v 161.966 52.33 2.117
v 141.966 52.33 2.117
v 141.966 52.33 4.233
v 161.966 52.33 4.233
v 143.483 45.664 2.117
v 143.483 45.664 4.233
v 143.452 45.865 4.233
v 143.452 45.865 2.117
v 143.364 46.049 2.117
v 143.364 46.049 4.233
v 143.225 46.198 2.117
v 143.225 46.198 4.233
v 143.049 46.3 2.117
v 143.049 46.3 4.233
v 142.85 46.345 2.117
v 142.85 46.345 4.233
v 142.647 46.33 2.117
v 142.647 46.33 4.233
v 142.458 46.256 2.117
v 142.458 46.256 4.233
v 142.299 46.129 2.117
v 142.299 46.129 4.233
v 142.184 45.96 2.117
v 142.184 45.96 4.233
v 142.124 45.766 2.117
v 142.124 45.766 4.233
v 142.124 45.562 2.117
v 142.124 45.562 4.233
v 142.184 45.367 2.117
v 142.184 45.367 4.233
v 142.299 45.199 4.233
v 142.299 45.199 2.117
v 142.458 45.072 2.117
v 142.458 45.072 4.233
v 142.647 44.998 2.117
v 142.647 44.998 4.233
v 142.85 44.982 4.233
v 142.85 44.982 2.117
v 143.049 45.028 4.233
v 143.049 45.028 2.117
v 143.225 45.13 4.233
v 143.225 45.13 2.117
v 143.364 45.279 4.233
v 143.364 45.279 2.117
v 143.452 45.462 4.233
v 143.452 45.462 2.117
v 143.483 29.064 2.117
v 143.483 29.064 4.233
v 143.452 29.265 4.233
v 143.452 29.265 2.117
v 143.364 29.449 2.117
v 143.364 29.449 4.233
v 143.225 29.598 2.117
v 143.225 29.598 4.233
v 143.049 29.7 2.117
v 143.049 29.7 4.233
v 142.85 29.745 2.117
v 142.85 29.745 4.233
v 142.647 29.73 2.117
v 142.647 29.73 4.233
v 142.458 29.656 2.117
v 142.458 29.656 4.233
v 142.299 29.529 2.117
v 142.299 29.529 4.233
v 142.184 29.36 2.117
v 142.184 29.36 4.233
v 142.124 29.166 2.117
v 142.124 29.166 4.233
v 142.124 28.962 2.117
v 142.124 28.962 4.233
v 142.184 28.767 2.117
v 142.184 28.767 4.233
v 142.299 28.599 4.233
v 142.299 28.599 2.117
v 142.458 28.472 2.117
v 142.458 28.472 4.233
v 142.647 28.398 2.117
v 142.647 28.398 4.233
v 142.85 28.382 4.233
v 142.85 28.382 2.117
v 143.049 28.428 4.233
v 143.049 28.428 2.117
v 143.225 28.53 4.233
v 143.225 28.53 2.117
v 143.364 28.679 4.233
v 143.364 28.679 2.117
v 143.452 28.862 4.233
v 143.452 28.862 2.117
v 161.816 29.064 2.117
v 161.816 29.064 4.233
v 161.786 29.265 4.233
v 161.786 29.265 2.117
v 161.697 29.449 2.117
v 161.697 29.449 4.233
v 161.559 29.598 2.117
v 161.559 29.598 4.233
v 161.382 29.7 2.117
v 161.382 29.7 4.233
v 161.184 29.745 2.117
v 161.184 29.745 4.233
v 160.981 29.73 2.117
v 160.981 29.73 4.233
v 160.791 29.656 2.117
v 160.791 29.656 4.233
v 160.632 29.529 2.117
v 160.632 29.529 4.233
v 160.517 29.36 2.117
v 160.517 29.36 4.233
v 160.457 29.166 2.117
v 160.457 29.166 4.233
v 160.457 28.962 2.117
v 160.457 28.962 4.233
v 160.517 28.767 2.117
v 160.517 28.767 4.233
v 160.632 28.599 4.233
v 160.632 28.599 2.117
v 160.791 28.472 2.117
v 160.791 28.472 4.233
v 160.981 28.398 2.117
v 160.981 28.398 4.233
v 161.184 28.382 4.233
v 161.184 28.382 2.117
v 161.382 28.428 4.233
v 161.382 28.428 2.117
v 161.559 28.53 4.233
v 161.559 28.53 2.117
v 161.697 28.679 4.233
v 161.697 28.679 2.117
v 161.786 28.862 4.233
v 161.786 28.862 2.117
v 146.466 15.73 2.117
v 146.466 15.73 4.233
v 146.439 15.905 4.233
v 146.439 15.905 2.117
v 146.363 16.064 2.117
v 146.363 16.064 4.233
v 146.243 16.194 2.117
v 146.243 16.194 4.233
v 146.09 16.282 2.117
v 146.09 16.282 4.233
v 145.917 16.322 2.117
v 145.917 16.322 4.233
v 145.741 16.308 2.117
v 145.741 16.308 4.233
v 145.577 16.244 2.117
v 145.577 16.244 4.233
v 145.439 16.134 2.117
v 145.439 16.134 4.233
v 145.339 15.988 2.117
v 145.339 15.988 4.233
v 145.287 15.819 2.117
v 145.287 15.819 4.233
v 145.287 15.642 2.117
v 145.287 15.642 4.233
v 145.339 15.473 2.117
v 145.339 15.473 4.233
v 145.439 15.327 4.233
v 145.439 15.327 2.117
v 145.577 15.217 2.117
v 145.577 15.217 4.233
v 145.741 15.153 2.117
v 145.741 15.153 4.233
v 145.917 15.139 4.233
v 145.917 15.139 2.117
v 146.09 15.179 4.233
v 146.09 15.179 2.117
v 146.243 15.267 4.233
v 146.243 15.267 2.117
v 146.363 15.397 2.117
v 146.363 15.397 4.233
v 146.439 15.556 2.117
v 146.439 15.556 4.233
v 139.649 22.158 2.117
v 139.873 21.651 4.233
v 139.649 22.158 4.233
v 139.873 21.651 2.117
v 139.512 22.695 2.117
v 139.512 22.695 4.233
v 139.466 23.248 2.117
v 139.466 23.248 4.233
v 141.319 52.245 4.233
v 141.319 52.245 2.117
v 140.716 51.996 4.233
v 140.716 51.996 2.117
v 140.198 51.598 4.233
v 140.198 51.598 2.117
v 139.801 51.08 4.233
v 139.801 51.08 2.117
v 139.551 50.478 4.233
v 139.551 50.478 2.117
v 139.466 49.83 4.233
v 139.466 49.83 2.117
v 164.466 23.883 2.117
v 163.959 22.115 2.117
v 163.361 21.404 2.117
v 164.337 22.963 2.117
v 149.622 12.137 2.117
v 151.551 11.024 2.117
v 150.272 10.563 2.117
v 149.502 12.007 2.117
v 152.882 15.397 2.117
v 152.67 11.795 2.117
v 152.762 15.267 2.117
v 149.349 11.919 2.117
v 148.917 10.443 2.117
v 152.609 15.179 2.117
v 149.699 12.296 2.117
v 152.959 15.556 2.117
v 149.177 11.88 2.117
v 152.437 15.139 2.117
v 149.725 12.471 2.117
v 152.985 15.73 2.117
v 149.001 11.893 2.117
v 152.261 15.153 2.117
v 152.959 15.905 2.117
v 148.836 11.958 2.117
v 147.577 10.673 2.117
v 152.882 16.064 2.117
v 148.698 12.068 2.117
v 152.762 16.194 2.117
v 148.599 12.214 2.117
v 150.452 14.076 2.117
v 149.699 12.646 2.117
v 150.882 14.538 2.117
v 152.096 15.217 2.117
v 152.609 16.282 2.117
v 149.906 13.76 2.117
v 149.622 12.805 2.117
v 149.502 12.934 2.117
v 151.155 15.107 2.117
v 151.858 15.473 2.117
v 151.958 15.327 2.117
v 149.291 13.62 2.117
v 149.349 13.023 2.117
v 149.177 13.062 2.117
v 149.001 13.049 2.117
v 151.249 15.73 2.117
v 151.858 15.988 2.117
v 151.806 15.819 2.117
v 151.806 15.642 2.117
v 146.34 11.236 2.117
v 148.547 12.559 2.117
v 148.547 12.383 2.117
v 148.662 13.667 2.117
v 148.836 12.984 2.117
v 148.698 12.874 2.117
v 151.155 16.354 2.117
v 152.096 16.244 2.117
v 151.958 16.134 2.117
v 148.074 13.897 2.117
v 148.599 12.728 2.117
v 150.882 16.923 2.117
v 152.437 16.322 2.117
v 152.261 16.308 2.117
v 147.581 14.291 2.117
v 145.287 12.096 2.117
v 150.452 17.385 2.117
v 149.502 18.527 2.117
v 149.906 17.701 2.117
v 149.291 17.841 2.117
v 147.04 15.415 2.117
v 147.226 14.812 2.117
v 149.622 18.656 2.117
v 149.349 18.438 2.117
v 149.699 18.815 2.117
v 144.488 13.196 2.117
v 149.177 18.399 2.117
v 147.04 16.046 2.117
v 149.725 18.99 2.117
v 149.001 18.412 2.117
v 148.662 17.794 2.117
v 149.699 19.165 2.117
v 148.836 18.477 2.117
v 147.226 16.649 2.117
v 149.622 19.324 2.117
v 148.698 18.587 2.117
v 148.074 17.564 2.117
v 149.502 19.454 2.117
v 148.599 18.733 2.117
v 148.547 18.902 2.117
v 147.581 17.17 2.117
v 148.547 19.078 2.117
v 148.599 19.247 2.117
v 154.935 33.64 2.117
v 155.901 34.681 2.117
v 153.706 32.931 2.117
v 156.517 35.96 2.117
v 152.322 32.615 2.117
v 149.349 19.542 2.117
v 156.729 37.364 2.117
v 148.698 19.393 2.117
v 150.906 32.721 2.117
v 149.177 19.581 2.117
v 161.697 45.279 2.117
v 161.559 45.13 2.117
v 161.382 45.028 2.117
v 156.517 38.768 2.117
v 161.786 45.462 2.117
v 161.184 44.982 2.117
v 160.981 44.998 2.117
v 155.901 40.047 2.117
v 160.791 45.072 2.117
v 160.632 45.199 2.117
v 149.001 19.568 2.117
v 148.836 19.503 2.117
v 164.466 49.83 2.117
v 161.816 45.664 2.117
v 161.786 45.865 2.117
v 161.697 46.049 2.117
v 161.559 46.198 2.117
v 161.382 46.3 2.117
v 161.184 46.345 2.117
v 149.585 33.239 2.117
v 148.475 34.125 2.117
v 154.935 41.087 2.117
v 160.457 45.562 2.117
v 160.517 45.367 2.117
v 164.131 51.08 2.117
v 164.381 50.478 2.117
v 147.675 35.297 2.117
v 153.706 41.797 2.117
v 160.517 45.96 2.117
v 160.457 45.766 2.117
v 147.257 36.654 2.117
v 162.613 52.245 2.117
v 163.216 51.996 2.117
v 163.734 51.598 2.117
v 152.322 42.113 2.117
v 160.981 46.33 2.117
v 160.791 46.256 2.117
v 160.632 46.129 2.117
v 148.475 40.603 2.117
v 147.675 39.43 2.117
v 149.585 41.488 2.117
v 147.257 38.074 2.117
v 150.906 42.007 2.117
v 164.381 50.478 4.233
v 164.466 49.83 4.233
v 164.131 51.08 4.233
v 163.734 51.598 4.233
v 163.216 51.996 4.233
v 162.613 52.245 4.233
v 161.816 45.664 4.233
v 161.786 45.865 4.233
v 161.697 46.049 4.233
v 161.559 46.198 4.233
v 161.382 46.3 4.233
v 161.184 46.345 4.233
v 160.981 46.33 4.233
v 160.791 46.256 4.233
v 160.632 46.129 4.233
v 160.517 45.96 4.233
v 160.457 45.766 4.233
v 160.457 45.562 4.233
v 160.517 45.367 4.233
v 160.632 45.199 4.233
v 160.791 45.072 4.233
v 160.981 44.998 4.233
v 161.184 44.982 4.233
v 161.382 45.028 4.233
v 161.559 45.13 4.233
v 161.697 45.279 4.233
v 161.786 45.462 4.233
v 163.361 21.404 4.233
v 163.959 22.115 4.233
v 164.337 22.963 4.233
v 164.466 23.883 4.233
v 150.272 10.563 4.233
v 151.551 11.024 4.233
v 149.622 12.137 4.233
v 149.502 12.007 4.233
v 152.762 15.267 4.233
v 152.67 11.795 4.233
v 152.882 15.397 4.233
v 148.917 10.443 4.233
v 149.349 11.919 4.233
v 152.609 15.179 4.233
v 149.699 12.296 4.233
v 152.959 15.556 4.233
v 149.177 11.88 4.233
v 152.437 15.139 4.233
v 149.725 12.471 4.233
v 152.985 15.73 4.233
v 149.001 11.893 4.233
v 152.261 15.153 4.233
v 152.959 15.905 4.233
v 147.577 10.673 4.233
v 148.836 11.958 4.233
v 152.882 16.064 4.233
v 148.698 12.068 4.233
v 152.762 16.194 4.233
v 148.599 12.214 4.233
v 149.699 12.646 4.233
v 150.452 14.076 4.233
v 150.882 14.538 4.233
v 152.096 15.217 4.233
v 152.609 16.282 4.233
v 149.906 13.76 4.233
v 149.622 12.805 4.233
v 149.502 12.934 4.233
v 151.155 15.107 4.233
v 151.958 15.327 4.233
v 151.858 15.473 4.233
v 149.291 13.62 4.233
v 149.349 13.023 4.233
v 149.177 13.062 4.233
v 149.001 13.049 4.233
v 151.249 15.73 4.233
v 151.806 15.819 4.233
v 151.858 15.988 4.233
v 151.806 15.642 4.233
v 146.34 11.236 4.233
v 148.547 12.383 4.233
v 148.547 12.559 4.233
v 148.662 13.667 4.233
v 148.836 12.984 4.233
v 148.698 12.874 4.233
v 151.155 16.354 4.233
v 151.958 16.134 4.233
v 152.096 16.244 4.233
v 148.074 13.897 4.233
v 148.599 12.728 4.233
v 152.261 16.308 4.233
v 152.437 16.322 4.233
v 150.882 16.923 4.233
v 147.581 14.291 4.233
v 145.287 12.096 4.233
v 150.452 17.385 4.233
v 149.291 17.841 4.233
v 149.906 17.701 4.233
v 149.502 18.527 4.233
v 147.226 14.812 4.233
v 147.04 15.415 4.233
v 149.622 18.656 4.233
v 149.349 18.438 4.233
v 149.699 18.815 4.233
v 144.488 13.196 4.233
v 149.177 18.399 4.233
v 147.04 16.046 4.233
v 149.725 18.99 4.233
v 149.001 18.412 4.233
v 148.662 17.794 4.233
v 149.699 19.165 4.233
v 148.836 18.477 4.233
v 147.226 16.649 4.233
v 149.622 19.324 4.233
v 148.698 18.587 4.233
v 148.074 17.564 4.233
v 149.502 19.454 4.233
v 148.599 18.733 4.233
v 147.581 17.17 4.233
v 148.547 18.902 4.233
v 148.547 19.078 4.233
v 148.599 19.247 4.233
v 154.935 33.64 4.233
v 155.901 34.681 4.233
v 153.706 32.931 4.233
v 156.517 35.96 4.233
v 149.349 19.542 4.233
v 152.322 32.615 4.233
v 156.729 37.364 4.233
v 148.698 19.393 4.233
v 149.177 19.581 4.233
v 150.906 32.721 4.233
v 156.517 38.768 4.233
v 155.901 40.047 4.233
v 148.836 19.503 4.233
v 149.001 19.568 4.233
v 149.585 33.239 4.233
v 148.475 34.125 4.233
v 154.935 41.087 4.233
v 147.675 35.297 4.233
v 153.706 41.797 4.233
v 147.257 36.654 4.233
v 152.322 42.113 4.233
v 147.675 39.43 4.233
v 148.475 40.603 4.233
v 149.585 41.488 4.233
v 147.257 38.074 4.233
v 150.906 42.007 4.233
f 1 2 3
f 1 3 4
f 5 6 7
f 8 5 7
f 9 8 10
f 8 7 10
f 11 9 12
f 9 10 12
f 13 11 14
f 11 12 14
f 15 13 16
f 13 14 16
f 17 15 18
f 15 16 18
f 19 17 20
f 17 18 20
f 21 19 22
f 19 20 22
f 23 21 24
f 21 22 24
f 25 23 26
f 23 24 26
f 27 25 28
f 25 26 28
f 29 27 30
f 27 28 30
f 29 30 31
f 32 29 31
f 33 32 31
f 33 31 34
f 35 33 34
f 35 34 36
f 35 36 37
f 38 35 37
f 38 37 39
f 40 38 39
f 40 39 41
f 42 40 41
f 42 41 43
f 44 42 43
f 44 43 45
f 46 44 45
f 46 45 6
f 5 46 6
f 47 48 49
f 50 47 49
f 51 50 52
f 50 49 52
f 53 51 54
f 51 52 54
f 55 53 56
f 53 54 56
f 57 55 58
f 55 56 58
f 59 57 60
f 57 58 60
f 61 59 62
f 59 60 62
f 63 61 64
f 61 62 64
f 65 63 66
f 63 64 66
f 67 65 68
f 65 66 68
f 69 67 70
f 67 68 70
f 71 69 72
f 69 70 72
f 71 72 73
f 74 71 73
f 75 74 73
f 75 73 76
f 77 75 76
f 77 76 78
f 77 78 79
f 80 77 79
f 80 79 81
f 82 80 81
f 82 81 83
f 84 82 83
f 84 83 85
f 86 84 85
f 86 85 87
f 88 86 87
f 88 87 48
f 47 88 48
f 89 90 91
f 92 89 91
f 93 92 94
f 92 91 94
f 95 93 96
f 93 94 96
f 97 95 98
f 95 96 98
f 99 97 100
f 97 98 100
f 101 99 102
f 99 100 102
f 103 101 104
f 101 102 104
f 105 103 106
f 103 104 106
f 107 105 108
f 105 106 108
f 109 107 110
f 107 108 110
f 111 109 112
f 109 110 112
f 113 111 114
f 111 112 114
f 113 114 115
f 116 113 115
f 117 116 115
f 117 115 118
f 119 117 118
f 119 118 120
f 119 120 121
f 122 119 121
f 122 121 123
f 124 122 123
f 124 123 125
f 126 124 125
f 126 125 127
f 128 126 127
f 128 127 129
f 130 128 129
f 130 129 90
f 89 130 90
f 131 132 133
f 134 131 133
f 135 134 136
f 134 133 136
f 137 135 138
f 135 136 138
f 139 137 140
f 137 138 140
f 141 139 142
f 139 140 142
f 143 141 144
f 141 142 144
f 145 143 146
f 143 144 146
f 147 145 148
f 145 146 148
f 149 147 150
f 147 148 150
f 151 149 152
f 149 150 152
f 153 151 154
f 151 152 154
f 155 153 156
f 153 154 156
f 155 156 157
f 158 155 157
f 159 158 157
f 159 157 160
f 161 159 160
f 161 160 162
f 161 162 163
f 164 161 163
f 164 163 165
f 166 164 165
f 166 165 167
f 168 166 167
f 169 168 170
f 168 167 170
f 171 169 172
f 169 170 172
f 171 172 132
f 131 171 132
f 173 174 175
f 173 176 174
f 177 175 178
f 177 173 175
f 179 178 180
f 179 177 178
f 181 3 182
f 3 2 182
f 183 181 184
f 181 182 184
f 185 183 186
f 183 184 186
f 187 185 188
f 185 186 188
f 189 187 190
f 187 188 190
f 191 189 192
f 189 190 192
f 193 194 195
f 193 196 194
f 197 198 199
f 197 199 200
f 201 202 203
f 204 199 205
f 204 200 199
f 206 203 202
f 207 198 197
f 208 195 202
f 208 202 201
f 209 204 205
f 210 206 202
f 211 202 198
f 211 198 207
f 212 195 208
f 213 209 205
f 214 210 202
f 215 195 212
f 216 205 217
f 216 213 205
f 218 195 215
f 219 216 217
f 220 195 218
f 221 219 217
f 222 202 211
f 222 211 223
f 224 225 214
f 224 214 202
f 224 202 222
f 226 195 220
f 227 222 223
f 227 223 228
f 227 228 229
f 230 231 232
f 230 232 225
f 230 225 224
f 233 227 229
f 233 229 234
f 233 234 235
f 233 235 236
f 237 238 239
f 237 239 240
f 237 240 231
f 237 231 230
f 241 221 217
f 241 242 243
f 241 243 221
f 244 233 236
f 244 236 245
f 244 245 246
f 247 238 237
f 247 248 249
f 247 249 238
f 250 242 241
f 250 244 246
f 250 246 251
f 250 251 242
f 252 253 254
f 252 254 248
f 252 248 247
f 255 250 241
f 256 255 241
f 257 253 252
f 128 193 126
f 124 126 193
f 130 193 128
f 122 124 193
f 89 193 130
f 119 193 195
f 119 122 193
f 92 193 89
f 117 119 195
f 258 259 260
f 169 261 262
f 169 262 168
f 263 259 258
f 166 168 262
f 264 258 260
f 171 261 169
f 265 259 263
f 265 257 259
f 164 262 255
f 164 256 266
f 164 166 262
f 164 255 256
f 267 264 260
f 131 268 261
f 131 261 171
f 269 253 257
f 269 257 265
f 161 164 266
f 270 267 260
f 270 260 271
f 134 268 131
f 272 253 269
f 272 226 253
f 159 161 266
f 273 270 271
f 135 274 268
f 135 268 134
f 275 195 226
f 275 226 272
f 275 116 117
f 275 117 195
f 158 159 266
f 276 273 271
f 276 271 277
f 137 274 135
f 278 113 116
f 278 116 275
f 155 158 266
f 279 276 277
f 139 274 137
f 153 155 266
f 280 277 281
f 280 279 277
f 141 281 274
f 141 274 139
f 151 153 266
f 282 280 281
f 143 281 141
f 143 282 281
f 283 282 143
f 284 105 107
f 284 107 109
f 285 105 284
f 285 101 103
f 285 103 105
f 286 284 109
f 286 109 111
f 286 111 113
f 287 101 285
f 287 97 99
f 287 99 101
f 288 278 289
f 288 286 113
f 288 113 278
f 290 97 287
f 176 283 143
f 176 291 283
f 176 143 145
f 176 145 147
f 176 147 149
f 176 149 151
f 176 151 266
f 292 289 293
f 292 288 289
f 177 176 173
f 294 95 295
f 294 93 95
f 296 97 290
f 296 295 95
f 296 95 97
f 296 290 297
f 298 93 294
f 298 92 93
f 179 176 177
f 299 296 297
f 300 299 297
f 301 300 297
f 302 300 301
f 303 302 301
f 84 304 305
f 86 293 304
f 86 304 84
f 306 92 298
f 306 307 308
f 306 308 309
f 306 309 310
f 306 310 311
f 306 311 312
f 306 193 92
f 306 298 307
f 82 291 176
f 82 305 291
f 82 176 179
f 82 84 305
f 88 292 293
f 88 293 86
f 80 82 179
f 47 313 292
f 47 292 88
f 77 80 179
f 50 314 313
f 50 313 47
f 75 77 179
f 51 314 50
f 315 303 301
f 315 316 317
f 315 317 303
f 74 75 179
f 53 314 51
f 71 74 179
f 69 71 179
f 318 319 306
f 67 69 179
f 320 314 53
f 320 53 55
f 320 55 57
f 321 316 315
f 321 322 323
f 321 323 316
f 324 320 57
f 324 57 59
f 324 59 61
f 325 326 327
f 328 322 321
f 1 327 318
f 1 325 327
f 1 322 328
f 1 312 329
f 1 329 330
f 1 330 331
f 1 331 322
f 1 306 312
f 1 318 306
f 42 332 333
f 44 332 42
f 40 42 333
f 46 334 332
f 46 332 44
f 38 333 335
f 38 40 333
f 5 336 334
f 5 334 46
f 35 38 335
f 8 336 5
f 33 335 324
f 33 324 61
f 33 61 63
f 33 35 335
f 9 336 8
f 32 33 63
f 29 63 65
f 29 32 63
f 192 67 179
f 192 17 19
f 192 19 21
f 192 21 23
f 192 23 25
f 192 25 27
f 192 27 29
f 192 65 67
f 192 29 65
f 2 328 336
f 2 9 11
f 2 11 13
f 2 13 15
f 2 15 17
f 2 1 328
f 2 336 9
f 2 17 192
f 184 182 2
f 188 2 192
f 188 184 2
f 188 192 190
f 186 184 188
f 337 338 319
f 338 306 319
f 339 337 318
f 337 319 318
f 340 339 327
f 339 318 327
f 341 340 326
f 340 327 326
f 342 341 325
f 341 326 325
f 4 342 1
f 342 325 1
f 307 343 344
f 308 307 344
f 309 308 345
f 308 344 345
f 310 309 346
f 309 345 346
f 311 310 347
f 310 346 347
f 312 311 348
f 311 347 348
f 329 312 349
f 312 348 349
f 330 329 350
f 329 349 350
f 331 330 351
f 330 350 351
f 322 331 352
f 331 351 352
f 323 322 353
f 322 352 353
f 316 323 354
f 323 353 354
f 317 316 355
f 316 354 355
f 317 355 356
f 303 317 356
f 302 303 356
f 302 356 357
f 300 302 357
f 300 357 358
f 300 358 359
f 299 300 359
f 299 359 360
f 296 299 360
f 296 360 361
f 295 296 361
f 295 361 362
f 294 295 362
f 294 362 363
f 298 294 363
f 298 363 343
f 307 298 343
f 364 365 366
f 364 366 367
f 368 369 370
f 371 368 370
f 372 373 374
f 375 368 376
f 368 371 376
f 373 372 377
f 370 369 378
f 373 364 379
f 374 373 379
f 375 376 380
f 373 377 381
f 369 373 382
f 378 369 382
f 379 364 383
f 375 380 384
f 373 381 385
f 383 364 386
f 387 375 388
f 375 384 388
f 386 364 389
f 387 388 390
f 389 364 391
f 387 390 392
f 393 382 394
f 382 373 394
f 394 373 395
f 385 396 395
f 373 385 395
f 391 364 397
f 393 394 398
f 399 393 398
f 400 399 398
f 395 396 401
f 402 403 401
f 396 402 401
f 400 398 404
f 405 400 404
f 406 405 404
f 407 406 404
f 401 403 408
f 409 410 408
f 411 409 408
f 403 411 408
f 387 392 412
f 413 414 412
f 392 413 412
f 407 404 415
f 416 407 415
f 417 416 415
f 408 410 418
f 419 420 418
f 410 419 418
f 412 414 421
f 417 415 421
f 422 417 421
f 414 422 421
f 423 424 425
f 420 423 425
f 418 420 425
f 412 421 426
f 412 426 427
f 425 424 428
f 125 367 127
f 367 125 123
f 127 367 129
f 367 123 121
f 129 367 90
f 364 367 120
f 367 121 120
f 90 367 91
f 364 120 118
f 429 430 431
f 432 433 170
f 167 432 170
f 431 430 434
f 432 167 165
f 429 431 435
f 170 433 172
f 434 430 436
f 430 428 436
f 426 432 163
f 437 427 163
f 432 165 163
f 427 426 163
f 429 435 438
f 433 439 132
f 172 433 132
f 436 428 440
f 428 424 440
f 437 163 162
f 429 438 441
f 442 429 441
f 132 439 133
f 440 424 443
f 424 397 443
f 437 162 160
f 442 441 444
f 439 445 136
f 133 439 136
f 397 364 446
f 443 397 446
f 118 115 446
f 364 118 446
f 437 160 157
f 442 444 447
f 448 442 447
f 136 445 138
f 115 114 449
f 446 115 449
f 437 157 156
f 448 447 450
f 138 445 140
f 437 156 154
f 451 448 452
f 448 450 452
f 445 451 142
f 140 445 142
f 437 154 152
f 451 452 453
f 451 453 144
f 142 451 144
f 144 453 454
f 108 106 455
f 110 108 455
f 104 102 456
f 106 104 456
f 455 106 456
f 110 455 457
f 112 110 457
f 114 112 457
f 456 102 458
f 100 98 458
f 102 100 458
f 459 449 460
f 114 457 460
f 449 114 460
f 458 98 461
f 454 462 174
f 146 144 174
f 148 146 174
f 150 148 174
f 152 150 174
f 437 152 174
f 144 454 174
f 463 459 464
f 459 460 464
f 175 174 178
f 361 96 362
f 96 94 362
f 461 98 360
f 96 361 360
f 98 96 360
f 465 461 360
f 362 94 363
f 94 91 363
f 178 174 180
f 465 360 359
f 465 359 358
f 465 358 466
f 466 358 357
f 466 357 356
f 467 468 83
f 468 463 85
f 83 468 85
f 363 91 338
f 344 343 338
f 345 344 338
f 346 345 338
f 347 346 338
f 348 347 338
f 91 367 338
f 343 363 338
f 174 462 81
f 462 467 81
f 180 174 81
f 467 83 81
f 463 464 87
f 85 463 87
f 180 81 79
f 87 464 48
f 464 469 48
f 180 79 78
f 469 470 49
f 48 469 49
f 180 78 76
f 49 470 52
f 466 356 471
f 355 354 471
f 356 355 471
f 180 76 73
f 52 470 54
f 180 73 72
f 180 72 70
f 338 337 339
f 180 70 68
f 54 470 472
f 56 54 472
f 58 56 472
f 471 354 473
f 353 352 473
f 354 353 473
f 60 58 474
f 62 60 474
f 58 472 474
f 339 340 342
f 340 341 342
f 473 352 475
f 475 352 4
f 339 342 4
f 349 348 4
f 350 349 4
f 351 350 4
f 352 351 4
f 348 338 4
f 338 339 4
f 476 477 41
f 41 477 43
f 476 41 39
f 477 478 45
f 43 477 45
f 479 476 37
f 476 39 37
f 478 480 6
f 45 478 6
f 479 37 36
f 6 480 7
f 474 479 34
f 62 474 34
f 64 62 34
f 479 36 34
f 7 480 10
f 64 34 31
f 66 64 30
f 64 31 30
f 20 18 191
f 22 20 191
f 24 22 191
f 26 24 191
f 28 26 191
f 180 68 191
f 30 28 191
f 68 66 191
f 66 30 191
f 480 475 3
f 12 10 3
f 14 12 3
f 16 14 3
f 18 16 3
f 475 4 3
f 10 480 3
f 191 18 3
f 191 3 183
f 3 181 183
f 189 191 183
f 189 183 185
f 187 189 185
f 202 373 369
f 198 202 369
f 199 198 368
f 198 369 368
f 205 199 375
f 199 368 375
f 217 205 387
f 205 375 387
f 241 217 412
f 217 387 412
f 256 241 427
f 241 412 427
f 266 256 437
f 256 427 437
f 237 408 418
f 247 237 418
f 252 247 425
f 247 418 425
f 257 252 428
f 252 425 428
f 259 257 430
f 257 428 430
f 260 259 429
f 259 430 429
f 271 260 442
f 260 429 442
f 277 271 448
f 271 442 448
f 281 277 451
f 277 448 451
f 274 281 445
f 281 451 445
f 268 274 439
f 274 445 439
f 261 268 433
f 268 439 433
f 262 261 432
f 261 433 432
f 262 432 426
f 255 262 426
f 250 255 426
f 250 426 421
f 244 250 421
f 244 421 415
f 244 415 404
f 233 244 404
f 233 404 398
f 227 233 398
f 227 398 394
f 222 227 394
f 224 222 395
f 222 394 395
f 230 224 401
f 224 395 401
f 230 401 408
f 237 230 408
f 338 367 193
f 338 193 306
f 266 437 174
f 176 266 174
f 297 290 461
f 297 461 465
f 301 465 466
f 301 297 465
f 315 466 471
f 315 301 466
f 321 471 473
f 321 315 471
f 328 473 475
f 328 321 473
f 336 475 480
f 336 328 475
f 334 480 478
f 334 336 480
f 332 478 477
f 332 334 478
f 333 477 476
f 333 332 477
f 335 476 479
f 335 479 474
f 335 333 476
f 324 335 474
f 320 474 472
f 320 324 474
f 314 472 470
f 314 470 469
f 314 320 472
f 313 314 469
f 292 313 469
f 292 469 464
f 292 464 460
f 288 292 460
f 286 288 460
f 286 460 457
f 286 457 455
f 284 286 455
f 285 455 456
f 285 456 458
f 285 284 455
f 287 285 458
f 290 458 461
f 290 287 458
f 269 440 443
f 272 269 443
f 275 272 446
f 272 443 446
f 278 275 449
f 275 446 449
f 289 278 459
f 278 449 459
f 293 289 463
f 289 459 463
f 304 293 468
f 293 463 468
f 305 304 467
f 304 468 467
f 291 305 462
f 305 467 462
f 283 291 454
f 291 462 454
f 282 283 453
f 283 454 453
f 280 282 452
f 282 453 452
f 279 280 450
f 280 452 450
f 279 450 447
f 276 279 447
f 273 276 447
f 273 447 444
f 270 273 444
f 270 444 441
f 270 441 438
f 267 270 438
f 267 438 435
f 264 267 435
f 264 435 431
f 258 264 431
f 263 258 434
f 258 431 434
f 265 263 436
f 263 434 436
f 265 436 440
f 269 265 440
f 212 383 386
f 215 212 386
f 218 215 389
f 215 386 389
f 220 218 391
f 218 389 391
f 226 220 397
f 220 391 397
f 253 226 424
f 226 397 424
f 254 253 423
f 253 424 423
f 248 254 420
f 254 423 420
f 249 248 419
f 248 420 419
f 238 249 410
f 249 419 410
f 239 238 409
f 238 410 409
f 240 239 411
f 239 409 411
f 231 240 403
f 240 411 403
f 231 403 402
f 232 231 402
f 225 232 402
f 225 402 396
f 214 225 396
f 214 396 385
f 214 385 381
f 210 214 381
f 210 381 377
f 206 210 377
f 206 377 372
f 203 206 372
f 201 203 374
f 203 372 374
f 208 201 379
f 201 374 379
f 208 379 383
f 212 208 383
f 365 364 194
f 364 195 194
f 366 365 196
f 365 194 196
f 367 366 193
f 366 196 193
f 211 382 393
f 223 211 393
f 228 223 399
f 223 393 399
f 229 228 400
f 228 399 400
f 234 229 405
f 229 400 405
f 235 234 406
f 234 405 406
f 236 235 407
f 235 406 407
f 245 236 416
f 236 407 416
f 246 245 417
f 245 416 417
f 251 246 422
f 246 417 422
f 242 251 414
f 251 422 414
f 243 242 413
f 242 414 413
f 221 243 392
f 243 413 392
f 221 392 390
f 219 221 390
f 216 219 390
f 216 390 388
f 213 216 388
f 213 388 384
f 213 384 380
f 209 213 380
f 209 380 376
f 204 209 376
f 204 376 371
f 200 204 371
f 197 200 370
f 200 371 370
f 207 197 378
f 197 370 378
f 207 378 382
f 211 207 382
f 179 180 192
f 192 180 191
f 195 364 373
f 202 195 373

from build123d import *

# Parameters (mm, degrees)
SKETCH1_W           = 304.8
SKETCH1_H           = 89.8
SKETCH1_R           = 14.2875
SKETCH1_R_2         = 2.54
SKETCH1_R_3         = 17.145
BOSS_EXTRUDE1_DEPTH = 6.35
SKETCH2_W           = 114.9
SKETCH2_H           = 89.8
SKETCH2_R           = 2.54
SKETCH2_R_2         = 17.145
CUT_EXTRUDE1_DEPTH  = 10
SKETCH4_R           = 6.35
SKETCH4_R_2         = 1.778
BOSS_EXTRUDE2_DEPTH = 6.35
FILLET1_R           = 10
FILLET2_R           = 7.5
SKETCH7_R           = 2.05
CUT_EXTRUDE2_DEPTH  = 10
SCALE1_SCALE        = 0.333333333


with BuildPart() as part:
    # Sketch1 → Boss-Extrude1 (new body)
    with BuildSketch(Plane.XY):
        with Locations((152.4, 44.9)):
            Rectangle(SKETCH1_W, SKETCH1_H)
        with Locations((152.4, 44.9)):
            Circle(SKETCH1_R, mode=Mode.SUBTRACT)
        with Locations((109.401585406, 62.859439014)):
            Circle(SKETCH1_R_2, mode=Mode.SUBTRACT)
        with Locations((109.399439014, 26.938414594)):
            Circle(SKETCH1_R_2, mode=Mode.SUBTRACT)
        with Locations((73.478414594, 26.940560986)):
            Circle(SKETCH1_R_2, mode=Mode.SUBTRACT)
        with Locations((73.480560986, 62.861585406)):
            Circle(SKETCH1_R_2, mode=Mode.SUBTRACT)
        with Locations((91.44, 44.9)):
            Circle(SKETCH1_R_3, mode=Mode.SUBTRACT)
        with Locations((195.400560986, 62.861585406)):
            Circle(SKETCH1_R_2, mode=Mode.SUBTRACT)
        with Locations((231.321585406, 62.859439014)):
            Circle(SKETCH1_R_2, mode=Mode.SUBTRACT)
        with Locations((231.319439014, 26.938414594)):
            Circle(SKETCH1_R_2, mode=Mode.SUBTRACT)
        with Locations((195.398414594, 26.940560986)):
            Circle(SKETCH1_R_2, mode=Mode.SUBTRACT)
        with Locations((213.36, 44.9)):
            Circle(SKETCH1_R_3, mode=Mode.SUBTRACT)
    extrude(amount=BOSS_EXTRUDE1_DEPTH)

    # Sketch2 → Cut-Extrude1 (cut)
    with BuildSketch(Plane.XY.offset(6.35)):
        with Locations((247.35, 44.9)):
            Rectangle(SKETCH2_W, SKETCH2_H)
        with Locations((195.398414594, 26.940560986)):
            Circle(SKETCH2_R, mode=Mode.SUBTRACT)
        with Locations((231.319439014, 26.938414594)):
            Circle(SKETCH2_R, mode=Mode.SUBTRACT)
        with Locations((213.36, 44.9)):
            Circle(SKETCH2_R_2, mode=Mode.SUBTRACT)
        with Locations((195.400560986, 62.861585406)):
            Circle(SKETCH2_R, mode=Mode.SUBTRACT)
        with Locations((231.321585406, 62.859439014)):
            Circle(SKETCH2_R, mode=Mode.SUBTRACT)
        with Locations((57.45, 44.9)):
            Rectangle(SKETCH2_W, SKETCH2_H)
        with Locations((73.478414594, 26.940560986)):
            Circle(SKETCH2_R, mode=Mode.SUBTRACT)
        with Locations((109.399439014, 26.938414594)):
            Circle(SKETCH2_R, mode=Mode.SUBTRACT)
        with Locations((91.44, 44.9)):
            Circle(SKETCH2_R_2, mode=Mode.SUBTRACT)
        with Locations((73.480560986, 62.861585406)):
            Circle(SKETCH2_R, mode=Mode.SUBTRACT)
        with Locations((109.401585406, 62.859439014)):
            Circle(SKETCH2_R, mode=Mode.SUBTRACT)
    extrude(amount=-CUT_EXTRUDE1_DEPTH, mode=Mode.SUBTRACT)

    # Sketch4 → Boss-Extrude2 (add)
    with BuildSketch(Plane.XY.offset(6.35)):
        with BuildLine():
            Line((189.9, 0), (154.512001483, -31.80682216))
            ThreePointArc((154.512001483, -31.80682216), (141.221457874, -35.647397134), (129.96508312, -27.604848226))
            Line((129.96508312, -27.604848226), (114.9, 0))
            Line((114.9, 0), (189.9, 0))
        make_face()
        with Locations((143.9, -20)):
            Circle(SKETCH4_R, mode=Mode.SUBTRACT)
        with Locations((143.9, -29.779)):
            Circle(SKETCH4_R_2, mode=Mode.SUBTRACT)
        with Locations((134.121, -20)):
            Circle(SKETCH4_R_2, mode=Mode.SUBTRACT)
        with Locations((153.679, -20)):
            Circle(SKETCH4_R_2, mode=Mode.SUBTRACT)
        with Locations((143.9, -10.221)):
            Circle(SKETCH4_R_2, mode=Mode.SUBTRACT)
    extrude(amount=-BOSS_EXTRUDE2_DEPTH)

    # Fillet1
    fillet1_edges = [part.edges().sort_by_distance(p)[0] for p in [
        (189.9, 0, 3.175),
        (114.9, 0, 3.175),
    ]]
    fillet(fillet1_edges, radius=FILLET1_R)

    # Fillet2
    fillet2_edges = [part.edges().sort_by_distance(p)[0] for p in [
        (114.9, 89.8, 3.175),
        (189.9, 89.8, 3.175),
    ]]
    fillet(fillet2_edges, radius=FILLET2_R)

    # Sketch7 → Cut-Extrude2 (cut)
    with BuildSketch(Plane.XY.offset(6.35)):
        with Locations((179.9, 69.8)):
            Circle(SKETCH7_R)
        with Locations((124.9, 69.8)):
            Circle(SKETCH7_R)
        with Locations((124.9, 20)):
            Circle(SKETCH7_R)
        with Locations((179.9, 20)):
            Circle(SKETCH7_R)
    extrude(amount=-CUT_EXTRUDE2_DEPTH, mode=Mode.SUBTRACT)


with BuildPart() as part_1:
    # Scale1: scaled about (151.749134019, 33.595748841, 3.175)
    add(part.part.scale(SCALE1_SCALE).moved(Location((101.166089346, 22.397165894, 2.116666667))))


solid = part_1.part
